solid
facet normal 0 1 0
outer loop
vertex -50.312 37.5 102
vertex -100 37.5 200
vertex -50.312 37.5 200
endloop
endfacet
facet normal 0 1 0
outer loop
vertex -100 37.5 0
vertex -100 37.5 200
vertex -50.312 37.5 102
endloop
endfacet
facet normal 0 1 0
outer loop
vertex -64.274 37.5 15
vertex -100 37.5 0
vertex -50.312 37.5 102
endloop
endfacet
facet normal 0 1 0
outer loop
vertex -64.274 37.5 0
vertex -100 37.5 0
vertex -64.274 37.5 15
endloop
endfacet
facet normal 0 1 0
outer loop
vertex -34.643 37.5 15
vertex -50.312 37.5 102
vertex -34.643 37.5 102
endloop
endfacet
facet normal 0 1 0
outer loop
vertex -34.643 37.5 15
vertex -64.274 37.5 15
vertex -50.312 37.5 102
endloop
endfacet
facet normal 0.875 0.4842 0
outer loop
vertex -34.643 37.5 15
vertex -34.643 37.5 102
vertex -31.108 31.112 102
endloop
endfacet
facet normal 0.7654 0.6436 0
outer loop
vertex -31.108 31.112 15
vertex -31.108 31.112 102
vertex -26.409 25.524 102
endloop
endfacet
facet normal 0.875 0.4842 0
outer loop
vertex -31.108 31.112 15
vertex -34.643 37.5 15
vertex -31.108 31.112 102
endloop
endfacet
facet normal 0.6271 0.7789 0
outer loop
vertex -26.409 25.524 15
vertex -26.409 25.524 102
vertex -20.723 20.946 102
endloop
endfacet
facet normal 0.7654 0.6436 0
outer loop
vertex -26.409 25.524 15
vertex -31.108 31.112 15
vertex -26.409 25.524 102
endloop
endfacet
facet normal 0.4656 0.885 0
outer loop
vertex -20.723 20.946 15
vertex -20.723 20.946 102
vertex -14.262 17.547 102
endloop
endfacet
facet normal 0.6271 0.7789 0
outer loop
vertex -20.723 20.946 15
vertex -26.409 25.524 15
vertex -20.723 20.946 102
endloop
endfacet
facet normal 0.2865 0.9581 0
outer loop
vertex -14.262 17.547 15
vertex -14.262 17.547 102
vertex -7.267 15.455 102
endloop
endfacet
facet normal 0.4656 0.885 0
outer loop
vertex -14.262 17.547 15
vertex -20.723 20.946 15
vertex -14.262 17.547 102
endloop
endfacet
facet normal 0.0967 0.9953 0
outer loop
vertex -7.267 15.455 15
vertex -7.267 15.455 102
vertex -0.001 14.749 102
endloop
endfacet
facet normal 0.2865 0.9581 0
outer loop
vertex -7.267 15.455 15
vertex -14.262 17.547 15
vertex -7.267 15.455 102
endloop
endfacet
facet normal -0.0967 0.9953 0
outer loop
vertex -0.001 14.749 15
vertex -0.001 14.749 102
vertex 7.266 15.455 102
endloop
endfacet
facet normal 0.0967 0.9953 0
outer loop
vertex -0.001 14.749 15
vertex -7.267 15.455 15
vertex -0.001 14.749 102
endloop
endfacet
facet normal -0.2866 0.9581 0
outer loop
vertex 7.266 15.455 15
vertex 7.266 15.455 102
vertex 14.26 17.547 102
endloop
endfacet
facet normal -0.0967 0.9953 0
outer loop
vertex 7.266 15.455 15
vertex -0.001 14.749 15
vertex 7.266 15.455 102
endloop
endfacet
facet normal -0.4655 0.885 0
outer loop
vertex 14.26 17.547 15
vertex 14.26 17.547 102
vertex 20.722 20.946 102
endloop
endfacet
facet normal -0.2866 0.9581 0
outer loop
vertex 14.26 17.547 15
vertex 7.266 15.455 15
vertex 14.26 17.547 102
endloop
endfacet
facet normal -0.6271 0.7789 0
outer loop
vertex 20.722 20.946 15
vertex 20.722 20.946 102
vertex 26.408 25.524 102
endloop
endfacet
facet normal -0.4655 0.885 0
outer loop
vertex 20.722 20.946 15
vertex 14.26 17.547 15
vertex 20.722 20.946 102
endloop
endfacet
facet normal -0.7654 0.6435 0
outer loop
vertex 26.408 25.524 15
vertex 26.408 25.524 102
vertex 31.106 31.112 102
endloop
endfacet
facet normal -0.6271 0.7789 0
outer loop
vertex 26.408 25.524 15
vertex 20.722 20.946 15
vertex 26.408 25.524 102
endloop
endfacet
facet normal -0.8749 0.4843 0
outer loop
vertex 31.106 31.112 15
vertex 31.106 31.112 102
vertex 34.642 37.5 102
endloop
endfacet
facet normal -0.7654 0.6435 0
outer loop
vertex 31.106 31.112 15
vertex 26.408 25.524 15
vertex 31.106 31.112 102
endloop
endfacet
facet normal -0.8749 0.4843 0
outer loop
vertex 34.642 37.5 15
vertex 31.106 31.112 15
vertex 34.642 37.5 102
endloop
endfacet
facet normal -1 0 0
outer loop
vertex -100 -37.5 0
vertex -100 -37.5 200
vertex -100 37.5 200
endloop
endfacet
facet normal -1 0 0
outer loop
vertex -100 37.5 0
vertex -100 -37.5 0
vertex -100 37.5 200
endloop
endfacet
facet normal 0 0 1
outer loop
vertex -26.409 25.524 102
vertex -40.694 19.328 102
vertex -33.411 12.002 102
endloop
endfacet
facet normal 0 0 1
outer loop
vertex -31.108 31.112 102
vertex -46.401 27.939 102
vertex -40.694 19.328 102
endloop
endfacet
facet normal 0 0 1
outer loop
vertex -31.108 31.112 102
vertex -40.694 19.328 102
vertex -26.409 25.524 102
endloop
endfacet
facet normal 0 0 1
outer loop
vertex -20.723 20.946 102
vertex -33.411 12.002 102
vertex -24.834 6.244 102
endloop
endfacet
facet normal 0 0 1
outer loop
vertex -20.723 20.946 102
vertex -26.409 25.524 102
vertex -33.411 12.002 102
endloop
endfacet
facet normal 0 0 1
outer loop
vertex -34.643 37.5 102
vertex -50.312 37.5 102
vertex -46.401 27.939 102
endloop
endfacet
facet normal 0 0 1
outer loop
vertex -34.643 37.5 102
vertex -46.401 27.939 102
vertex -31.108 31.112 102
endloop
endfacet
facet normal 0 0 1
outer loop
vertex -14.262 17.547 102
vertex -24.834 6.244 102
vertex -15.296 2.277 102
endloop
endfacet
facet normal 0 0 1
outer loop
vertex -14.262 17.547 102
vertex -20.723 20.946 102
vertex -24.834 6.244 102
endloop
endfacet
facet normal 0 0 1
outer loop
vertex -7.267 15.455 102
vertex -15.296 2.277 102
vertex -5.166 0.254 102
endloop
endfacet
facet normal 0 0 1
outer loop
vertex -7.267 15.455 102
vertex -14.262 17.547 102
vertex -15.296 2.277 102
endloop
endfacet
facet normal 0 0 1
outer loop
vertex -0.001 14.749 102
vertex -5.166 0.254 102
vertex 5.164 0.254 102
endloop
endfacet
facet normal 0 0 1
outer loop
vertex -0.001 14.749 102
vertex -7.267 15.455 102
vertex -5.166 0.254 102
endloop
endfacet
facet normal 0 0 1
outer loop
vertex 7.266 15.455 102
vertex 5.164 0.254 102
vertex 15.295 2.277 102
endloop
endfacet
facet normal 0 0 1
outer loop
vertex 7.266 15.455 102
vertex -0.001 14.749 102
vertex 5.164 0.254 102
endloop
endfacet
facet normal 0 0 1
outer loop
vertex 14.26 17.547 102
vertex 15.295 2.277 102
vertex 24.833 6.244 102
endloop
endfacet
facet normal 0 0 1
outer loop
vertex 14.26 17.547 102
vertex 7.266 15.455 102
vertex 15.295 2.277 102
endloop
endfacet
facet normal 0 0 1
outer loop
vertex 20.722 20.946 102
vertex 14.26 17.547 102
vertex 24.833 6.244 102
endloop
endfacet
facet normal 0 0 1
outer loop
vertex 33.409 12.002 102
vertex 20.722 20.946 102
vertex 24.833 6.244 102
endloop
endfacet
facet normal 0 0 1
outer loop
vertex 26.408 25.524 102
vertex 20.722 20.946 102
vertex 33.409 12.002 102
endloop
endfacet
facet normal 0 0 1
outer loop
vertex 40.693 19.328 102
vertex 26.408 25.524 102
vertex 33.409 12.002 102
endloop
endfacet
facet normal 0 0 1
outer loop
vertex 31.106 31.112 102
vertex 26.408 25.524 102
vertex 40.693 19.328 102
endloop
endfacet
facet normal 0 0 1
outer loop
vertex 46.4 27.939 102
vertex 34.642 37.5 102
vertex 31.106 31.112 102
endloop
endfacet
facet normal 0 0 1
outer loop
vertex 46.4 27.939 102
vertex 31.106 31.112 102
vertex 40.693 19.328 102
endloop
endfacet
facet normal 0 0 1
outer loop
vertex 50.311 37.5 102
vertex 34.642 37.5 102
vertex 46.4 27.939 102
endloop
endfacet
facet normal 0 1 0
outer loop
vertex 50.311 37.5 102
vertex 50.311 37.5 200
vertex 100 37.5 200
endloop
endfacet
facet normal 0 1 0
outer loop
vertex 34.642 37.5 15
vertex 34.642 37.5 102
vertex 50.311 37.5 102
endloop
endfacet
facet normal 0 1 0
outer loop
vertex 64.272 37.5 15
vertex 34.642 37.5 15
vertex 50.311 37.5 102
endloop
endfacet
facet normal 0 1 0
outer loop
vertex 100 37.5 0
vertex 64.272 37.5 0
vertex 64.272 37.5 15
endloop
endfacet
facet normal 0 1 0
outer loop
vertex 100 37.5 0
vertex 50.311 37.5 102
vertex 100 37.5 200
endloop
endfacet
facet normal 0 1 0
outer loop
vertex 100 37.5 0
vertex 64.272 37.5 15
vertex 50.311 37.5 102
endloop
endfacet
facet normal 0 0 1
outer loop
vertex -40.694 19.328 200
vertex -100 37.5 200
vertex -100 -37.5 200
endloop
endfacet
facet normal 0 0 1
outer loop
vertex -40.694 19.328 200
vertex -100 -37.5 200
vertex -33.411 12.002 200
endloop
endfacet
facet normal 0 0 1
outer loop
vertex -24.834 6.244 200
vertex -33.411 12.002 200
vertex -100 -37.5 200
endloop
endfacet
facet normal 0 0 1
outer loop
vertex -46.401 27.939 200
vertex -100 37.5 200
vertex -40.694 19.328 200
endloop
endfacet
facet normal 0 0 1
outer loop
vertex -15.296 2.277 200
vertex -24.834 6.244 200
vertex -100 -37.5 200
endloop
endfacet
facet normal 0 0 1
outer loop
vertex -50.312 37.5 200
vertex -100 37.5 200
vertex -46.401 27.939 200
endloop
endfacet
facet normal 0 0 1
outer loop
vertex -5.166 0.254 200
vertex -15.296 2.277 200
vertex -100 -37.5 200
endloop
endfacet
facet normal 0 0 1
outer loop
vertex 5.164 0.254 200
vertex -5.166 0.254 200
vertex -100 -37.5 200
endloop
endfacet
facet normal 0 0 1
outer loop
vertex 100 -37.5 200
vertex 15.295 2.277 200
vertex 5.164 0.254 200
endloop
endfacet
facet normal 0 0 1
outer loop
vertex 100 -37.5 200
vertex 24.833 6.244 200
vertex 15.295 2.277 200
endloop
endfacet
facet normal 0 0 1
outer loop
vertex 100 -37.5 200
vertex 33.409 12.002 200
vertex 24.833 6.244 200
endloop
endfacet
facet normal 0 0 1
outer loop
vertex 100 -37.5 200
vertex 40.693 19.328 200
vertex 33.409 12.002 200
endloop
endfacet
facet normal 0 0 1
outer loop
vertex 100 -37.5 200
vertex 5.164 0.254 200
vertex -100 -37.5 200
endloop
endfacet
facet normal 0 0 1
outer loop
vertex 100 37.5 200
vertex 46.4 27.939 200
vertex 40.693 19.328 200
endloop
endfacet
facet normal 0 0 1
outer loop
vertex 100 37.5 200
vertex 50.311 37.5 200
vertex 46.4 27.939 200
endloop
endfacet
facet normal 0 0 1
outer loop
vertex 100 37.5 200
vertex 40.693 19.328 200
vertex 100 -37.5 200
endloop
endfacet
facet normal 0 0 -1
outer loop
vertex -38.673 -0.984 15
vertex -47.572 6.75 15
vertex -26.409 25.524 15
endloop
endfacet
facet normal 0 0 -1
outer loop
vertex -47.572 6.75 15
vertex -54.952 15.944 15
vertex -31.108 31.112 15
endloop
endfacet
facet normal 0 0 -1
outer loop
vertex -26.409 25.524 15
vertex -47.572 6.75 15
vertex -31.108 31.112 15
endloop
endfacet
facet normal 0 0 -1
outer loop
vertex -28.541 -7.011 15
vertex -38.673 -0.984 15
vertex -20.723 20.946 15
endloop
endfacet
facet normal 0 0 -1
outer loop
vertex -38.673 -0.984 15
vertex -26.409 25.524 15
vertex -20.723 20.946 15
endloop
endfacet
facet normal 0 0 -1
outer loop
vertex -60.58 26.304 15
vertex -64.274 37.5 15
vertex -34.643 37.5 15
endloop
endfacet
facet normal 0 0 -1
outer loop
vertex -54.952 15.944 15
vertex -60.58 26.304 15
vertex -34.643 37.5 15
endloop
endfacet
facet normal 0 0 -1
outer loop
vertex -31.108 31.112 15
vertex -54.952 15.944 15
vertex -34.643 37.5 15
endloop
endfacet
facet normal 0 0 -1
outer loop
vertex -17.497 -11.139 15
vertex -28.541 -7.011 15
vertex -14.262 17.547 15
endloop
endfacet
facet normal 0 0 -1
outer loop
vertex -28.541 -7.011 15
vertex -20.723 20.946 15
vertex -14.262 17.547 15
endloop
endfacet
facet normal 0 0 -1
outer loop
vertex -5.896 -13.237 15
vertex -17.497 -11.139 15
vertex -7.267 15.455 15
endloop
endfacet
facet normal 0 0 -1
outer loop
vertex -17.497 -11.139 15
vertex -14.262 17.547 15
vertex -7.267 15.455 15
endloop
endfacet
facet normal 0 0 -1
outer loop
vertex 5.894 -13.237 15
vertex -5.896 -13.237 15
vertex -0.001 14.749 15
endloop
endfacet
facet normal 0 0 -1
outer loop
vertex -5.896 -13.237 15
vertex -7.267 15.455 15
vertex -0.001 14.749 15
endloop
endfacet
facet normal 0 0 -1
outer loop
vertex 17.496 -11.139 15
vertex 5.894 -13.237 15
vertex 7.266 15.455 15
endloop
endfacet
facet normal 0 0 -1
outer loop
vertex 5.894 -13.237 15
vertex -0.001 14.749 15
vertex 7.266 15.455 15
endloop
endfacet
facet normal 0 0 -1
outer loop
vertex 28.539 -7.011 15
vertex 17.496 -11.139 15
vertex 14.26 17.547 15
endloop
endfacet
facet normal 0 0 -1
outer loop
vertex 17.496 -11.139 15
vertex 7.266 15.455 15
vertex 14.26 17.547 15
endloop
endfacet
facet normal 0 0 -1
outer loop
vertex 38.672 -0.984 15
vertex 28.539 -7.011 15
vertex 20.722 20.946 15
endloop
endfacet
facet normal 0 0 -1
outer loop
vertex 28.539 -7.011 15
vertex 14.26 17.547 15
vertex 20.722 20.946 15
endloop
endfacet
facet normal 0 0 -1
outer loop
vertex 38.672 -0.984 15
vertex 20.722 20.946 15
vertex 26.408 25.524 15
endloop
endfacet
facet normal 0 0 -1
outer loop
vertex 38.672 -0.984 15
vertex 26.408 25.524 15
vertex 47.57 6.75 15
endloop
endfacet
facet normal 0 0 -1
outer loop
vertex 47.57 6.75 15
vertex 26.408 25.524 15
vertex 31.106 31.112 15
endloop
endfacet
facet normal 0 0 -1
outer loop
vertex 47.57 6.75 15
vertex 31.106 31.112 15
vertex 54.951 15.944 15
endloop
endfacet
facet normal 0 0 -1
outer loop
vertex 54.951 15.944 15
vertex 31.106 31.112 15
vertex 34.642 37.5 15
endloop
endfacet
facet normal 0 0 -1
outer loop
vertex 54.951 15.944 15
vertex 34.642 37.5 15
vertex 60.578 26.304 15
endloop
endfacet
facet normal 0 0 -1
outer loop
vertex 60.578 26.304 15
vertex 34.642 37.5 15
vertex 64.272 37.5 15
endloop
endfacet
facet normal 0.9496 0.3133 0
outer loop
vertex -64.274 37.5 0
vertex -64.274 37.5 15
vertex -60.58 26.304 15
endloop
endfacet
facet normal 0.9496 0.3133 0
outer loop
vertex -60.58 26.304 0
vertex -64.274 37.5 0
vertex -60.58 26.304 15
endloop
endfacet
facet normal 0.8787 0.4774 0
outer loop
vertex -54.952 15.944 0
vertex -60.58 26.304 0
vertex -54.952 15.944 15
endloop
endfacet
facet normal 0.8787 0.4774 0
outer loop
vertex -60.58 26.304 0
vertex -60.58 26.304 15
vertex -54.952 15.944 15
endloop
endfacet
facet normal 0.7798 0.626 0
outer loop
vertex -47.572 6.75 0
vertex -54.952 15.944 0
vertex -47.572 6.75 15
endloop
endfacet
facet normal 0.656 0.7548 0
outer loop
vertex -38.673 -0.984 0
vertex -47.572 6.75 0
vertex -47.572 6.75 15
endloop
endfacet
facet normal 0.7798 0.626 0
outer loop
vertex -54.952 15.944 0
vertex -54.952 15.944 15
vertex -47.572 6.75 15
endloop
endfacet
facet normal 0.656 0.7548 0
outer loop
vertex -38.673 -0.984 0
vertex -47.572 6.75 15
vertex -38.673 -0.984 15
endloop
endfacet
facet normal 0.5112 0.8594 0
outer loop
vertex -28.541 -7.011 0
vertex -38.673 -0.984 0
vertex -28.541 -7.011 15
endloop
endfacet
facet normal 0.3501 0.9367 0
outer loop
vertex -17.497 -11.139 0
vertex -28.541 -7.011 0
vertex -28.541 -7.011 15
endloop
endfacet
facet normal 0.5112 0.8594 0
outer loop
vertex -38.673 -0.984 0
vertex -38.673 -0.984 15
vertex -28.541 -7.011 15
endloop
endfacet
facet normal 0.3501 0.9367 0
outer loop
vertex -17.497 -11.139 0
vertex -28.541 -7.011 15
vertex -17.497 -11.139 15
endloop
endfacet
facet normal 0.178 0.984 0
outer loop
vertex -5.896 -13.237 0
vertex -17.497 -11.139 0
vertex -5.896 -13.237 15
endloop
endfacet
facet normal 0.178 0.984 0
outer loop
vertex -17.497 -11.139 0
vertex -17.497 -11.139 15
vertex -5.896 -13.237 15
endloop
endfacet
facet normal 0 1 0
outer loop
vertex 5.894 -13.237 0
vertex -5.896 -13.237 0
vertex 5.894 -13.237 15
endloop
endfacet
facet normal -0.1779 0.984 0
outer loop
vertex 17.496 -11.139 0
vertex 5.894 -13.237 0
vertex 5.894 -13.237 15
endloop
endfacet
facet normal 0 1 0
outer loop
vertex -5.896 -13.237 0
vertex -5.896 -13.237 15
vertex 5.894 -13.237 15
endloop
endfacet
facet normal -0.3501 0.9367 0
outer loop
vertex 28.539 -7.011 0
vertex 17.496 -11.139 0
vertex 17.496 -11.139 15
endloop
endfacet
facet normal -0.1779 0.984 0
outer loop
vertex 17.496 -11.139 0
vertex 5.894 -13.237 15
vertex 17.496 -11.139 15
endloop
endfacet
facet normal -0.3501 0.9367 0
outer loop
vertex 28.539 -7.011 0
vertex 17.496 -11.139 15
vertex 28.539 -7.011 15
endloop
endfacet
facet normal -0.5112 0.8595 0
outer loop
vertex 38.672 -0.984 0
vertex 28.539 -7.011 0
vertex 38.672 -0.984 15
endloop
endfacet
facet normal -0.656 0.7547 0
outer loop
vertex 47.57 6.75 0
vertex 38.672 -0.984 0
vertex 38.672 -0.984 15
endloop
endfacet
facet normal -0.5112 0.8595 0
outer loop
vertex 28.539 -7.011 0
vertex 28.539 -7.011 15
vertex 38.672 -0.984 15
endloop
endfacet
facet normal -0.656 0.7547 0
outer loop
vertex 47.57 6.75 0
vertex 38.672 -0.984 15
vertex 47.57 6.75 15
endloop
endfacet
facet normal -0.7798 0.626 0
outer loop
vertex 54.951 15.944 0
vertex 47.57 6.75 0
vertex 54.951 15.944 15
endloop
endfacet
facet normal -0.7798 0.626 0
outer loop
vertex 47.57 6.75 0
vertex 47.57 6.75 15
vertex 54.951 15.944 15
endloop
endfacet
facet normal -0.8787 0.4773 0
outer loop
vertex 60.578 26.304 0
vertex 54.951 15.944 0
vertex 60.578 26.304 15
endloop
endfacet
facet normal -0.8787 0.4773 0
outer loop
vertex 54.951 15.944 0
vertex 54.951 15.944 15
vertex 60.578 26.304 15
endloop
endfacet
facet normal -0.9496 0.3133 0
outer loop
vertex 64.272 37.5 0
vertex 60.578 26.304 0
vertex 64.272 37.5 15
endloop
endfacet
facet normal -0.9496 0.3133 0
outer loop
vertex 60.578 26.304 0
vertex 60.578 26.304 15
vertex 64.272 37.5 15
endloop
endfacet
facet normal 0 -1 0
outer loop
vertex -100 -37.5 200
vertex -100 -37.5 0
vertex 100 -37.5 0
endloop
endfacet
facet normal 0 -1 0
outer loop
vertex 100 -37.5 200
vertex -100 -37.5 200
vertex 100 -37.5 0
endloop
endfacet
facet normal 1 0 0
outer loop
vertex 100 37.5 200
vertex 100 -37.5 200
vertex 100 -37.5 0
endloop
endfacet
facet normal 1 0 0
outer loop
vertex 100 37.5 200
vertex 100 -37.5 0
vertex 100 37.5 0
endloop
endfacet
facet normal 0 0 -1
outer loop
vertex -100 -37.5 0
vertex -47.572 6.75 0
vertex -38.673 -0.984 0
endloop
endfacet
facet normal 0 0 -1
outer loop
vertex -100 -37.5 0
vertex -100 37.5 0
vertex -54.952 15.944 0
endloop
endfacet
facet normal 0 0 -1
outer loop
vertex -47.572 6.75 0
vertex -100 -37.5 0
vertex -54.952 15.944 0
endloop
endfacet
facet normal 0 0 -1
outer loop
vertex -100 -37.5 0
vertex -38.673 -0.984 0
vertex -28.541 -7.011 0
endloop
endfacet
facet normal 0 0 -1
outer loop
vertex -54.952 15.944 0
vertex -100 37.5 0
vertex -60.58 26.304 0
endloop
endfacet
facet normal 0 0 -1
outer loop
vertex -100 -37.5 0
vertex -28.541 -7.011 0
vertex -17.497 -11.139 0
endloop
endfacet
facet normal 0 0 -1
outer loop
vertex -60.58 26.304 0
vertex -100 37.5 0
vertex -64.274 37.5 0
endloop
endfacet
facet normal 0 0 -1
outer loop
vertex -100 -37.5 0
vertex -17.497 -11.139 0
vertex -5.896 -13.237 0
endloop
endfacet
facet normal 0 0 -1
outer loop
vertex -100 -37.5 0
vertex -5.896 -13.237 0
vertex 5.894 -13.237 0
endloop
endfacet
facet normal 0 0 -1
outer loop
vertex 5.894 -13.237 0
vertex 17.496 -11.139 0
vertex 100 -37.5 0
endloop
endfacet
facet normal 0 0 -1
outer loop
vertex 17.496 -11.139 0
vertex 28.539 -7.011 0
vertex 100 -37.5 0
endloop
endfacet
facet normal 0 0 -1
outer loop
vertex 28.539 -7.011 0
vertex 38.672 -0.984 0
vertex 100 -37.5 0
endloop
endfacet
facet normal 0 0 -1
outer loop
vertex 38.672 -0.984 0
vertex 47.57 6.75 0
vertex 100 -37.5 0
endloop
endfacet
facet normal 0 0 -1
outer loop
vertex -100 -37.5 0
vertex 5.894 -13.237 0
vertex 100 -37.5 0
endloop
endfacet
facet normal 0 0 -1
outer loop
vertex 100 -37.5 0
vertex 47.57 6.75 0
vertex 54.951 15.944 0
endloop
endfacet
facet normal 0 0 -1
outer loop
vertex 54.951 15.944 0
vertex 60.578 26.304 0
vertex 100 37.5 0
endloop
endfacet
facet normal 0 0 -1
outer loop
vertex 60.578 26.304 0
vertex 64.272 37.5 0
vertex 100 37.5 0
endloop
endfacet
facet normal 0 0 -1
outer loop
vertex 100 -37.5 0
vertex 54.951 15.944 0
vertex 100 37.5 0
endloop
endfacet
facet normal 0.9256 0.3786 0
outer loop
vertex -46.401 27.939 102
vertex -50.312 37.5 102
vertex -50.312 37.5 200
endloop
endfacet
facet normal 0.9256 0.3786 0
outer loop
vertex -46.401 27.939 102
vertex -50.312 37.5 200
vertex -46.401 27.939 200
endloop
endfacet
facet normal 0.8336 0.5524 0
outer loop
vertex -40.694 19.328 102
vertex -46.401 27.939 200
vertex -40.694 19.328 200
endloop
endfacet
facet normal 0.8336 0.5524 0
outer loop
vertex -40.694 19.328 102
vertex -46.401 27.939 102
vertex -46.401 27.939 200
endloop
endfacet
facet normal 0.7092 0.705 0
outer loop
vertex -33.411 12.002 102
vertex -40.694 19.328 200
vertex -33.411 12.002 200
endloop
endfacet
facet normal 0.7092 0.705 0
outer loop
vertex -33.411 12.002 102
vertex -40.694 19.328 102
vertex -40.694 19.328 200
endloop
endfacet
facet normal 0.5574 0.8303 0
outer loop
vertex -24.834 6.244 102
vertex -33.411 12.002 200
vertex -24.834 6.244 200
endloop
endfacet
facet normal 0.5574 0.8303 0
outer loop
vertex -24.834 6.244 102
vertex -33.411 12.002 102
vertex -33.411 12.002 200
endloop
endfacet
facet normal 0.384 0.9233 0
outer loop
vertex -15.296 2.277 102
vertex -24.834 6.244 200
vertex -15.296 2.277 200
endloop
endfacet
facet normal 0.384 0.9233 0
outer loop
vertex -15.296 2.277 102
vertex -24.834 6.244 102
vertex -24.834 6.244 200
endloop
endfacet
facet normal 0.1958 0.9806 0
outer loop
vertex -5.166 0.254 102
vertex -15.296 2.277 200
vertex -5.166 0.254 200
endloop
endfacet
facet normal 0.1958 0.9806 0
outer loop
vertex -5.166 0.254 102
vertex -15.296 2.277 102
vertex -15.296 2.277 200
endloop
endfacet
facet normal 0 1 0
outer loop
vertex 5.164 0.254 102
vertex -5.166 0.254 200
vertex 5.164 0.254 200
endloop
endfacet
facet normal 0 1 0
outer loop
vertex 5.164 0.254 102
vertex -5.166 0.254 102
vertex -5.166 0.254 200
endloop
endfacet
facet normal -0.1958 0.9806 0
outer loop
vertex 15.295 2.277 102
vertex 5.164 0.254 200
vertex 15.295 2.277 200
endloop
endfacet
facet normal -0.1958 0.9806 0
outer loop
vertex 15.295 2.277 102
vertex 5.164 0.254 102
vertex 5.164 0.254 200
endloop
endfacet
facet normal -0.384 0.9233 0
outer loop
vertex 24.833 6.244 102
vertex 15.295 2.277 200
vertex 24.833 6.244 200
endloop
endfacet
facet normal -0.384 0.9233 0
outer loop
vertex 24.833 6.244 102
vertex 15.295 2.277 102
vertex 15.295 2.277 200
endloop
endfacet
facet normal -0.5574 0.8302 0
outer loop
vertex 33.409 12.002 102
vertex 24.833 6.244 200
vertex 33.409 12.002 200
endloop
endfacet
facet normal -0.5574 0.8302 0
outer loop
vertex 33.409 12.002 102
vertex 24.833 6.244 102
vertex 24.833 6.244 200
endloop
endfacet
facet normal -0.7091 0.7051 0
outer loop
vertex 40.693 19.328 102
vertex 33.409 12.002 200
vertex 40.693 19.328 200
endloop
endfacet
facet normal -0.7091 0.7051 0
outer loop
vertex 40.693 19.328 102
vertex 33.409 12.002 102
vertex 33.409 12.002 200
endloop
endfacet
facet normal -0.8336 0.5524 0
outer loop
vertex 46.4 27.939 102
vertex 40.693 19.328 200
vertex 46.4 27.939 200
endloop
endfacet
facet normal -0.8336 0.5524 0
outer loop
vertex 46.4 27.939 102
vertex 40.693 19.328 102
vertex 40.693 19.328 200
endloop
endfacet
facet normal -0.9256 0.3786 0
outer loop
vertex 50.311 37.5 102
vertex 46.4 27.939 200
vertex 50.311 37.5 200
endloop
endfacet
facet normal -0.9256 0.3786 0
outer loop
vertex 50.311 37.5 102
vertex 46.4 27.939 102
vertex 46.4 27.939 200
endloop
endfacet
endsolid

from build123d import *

# Parameters (mm, degrees)
SKETCH1_W           = 200
SKETCH1_H           = 75
BOSS_EXTRUDE1_DEPTH = 200
CUT_EXTRUDE1_START  = -98
SKETCH2_R           = 52.5
CUT_EXTRUDE1_DEPTH  = 98
CUT_EXTRUDE2_START  = -87
SKETCH3_R           = 37.75
CUT_EXTRUDE2_DEPTH  = 87
SKETCH4_R           = 66
CUT_EXTRUDE3_DEPTH  = 200


with BuildPart() as part:
    # Sketch1 → Boss-Extrude1 (new body)
    with BuildSketch(Plane.XY):
        Rectangle(SKETCH1_W, SKETCH1_H)
    extrude(amount=BOSS_EXTRUDE1_DEPTH)

    # Sketch2 → Cut-Extrude1 (cut)
    with BuildSketch(Plane.XY.offset(200).offset(CUT_EXTRUDE1_START)):
        with Locations((-0.000678119, 52.499321881)):
            Circle(SKETCH2_R)
    extrude(amount=CUT_EXTRUDE1_DEPTH, mode=Mode.SUBTRACT)

    # Sketch3 → Cut-Extrude2 (cut)
    with BuildSketch(Plane.XY.offset(102).offset(CUT_EXTRUDE2_START)):
        with Locations((-0.000678119, 52.499321881)):
            Circle(SKETCH3_R)
    extrude(amount=CUT_EXTRUDE2_DEPTH, mode=Mode.SUBTRACT)

    # Sketch4 → Cut-Extrude3 (cut)
    with BuildSketch(Plane.XY.offset(15)):
        with Locations((-0.000678119, 52.499321881)):
            Circle(SKETCH4_R)
    extrude(amount=-CUT_EXTRUDE3_DEPTH, mode=Mode.SUBTRACT)


solid = part.part
